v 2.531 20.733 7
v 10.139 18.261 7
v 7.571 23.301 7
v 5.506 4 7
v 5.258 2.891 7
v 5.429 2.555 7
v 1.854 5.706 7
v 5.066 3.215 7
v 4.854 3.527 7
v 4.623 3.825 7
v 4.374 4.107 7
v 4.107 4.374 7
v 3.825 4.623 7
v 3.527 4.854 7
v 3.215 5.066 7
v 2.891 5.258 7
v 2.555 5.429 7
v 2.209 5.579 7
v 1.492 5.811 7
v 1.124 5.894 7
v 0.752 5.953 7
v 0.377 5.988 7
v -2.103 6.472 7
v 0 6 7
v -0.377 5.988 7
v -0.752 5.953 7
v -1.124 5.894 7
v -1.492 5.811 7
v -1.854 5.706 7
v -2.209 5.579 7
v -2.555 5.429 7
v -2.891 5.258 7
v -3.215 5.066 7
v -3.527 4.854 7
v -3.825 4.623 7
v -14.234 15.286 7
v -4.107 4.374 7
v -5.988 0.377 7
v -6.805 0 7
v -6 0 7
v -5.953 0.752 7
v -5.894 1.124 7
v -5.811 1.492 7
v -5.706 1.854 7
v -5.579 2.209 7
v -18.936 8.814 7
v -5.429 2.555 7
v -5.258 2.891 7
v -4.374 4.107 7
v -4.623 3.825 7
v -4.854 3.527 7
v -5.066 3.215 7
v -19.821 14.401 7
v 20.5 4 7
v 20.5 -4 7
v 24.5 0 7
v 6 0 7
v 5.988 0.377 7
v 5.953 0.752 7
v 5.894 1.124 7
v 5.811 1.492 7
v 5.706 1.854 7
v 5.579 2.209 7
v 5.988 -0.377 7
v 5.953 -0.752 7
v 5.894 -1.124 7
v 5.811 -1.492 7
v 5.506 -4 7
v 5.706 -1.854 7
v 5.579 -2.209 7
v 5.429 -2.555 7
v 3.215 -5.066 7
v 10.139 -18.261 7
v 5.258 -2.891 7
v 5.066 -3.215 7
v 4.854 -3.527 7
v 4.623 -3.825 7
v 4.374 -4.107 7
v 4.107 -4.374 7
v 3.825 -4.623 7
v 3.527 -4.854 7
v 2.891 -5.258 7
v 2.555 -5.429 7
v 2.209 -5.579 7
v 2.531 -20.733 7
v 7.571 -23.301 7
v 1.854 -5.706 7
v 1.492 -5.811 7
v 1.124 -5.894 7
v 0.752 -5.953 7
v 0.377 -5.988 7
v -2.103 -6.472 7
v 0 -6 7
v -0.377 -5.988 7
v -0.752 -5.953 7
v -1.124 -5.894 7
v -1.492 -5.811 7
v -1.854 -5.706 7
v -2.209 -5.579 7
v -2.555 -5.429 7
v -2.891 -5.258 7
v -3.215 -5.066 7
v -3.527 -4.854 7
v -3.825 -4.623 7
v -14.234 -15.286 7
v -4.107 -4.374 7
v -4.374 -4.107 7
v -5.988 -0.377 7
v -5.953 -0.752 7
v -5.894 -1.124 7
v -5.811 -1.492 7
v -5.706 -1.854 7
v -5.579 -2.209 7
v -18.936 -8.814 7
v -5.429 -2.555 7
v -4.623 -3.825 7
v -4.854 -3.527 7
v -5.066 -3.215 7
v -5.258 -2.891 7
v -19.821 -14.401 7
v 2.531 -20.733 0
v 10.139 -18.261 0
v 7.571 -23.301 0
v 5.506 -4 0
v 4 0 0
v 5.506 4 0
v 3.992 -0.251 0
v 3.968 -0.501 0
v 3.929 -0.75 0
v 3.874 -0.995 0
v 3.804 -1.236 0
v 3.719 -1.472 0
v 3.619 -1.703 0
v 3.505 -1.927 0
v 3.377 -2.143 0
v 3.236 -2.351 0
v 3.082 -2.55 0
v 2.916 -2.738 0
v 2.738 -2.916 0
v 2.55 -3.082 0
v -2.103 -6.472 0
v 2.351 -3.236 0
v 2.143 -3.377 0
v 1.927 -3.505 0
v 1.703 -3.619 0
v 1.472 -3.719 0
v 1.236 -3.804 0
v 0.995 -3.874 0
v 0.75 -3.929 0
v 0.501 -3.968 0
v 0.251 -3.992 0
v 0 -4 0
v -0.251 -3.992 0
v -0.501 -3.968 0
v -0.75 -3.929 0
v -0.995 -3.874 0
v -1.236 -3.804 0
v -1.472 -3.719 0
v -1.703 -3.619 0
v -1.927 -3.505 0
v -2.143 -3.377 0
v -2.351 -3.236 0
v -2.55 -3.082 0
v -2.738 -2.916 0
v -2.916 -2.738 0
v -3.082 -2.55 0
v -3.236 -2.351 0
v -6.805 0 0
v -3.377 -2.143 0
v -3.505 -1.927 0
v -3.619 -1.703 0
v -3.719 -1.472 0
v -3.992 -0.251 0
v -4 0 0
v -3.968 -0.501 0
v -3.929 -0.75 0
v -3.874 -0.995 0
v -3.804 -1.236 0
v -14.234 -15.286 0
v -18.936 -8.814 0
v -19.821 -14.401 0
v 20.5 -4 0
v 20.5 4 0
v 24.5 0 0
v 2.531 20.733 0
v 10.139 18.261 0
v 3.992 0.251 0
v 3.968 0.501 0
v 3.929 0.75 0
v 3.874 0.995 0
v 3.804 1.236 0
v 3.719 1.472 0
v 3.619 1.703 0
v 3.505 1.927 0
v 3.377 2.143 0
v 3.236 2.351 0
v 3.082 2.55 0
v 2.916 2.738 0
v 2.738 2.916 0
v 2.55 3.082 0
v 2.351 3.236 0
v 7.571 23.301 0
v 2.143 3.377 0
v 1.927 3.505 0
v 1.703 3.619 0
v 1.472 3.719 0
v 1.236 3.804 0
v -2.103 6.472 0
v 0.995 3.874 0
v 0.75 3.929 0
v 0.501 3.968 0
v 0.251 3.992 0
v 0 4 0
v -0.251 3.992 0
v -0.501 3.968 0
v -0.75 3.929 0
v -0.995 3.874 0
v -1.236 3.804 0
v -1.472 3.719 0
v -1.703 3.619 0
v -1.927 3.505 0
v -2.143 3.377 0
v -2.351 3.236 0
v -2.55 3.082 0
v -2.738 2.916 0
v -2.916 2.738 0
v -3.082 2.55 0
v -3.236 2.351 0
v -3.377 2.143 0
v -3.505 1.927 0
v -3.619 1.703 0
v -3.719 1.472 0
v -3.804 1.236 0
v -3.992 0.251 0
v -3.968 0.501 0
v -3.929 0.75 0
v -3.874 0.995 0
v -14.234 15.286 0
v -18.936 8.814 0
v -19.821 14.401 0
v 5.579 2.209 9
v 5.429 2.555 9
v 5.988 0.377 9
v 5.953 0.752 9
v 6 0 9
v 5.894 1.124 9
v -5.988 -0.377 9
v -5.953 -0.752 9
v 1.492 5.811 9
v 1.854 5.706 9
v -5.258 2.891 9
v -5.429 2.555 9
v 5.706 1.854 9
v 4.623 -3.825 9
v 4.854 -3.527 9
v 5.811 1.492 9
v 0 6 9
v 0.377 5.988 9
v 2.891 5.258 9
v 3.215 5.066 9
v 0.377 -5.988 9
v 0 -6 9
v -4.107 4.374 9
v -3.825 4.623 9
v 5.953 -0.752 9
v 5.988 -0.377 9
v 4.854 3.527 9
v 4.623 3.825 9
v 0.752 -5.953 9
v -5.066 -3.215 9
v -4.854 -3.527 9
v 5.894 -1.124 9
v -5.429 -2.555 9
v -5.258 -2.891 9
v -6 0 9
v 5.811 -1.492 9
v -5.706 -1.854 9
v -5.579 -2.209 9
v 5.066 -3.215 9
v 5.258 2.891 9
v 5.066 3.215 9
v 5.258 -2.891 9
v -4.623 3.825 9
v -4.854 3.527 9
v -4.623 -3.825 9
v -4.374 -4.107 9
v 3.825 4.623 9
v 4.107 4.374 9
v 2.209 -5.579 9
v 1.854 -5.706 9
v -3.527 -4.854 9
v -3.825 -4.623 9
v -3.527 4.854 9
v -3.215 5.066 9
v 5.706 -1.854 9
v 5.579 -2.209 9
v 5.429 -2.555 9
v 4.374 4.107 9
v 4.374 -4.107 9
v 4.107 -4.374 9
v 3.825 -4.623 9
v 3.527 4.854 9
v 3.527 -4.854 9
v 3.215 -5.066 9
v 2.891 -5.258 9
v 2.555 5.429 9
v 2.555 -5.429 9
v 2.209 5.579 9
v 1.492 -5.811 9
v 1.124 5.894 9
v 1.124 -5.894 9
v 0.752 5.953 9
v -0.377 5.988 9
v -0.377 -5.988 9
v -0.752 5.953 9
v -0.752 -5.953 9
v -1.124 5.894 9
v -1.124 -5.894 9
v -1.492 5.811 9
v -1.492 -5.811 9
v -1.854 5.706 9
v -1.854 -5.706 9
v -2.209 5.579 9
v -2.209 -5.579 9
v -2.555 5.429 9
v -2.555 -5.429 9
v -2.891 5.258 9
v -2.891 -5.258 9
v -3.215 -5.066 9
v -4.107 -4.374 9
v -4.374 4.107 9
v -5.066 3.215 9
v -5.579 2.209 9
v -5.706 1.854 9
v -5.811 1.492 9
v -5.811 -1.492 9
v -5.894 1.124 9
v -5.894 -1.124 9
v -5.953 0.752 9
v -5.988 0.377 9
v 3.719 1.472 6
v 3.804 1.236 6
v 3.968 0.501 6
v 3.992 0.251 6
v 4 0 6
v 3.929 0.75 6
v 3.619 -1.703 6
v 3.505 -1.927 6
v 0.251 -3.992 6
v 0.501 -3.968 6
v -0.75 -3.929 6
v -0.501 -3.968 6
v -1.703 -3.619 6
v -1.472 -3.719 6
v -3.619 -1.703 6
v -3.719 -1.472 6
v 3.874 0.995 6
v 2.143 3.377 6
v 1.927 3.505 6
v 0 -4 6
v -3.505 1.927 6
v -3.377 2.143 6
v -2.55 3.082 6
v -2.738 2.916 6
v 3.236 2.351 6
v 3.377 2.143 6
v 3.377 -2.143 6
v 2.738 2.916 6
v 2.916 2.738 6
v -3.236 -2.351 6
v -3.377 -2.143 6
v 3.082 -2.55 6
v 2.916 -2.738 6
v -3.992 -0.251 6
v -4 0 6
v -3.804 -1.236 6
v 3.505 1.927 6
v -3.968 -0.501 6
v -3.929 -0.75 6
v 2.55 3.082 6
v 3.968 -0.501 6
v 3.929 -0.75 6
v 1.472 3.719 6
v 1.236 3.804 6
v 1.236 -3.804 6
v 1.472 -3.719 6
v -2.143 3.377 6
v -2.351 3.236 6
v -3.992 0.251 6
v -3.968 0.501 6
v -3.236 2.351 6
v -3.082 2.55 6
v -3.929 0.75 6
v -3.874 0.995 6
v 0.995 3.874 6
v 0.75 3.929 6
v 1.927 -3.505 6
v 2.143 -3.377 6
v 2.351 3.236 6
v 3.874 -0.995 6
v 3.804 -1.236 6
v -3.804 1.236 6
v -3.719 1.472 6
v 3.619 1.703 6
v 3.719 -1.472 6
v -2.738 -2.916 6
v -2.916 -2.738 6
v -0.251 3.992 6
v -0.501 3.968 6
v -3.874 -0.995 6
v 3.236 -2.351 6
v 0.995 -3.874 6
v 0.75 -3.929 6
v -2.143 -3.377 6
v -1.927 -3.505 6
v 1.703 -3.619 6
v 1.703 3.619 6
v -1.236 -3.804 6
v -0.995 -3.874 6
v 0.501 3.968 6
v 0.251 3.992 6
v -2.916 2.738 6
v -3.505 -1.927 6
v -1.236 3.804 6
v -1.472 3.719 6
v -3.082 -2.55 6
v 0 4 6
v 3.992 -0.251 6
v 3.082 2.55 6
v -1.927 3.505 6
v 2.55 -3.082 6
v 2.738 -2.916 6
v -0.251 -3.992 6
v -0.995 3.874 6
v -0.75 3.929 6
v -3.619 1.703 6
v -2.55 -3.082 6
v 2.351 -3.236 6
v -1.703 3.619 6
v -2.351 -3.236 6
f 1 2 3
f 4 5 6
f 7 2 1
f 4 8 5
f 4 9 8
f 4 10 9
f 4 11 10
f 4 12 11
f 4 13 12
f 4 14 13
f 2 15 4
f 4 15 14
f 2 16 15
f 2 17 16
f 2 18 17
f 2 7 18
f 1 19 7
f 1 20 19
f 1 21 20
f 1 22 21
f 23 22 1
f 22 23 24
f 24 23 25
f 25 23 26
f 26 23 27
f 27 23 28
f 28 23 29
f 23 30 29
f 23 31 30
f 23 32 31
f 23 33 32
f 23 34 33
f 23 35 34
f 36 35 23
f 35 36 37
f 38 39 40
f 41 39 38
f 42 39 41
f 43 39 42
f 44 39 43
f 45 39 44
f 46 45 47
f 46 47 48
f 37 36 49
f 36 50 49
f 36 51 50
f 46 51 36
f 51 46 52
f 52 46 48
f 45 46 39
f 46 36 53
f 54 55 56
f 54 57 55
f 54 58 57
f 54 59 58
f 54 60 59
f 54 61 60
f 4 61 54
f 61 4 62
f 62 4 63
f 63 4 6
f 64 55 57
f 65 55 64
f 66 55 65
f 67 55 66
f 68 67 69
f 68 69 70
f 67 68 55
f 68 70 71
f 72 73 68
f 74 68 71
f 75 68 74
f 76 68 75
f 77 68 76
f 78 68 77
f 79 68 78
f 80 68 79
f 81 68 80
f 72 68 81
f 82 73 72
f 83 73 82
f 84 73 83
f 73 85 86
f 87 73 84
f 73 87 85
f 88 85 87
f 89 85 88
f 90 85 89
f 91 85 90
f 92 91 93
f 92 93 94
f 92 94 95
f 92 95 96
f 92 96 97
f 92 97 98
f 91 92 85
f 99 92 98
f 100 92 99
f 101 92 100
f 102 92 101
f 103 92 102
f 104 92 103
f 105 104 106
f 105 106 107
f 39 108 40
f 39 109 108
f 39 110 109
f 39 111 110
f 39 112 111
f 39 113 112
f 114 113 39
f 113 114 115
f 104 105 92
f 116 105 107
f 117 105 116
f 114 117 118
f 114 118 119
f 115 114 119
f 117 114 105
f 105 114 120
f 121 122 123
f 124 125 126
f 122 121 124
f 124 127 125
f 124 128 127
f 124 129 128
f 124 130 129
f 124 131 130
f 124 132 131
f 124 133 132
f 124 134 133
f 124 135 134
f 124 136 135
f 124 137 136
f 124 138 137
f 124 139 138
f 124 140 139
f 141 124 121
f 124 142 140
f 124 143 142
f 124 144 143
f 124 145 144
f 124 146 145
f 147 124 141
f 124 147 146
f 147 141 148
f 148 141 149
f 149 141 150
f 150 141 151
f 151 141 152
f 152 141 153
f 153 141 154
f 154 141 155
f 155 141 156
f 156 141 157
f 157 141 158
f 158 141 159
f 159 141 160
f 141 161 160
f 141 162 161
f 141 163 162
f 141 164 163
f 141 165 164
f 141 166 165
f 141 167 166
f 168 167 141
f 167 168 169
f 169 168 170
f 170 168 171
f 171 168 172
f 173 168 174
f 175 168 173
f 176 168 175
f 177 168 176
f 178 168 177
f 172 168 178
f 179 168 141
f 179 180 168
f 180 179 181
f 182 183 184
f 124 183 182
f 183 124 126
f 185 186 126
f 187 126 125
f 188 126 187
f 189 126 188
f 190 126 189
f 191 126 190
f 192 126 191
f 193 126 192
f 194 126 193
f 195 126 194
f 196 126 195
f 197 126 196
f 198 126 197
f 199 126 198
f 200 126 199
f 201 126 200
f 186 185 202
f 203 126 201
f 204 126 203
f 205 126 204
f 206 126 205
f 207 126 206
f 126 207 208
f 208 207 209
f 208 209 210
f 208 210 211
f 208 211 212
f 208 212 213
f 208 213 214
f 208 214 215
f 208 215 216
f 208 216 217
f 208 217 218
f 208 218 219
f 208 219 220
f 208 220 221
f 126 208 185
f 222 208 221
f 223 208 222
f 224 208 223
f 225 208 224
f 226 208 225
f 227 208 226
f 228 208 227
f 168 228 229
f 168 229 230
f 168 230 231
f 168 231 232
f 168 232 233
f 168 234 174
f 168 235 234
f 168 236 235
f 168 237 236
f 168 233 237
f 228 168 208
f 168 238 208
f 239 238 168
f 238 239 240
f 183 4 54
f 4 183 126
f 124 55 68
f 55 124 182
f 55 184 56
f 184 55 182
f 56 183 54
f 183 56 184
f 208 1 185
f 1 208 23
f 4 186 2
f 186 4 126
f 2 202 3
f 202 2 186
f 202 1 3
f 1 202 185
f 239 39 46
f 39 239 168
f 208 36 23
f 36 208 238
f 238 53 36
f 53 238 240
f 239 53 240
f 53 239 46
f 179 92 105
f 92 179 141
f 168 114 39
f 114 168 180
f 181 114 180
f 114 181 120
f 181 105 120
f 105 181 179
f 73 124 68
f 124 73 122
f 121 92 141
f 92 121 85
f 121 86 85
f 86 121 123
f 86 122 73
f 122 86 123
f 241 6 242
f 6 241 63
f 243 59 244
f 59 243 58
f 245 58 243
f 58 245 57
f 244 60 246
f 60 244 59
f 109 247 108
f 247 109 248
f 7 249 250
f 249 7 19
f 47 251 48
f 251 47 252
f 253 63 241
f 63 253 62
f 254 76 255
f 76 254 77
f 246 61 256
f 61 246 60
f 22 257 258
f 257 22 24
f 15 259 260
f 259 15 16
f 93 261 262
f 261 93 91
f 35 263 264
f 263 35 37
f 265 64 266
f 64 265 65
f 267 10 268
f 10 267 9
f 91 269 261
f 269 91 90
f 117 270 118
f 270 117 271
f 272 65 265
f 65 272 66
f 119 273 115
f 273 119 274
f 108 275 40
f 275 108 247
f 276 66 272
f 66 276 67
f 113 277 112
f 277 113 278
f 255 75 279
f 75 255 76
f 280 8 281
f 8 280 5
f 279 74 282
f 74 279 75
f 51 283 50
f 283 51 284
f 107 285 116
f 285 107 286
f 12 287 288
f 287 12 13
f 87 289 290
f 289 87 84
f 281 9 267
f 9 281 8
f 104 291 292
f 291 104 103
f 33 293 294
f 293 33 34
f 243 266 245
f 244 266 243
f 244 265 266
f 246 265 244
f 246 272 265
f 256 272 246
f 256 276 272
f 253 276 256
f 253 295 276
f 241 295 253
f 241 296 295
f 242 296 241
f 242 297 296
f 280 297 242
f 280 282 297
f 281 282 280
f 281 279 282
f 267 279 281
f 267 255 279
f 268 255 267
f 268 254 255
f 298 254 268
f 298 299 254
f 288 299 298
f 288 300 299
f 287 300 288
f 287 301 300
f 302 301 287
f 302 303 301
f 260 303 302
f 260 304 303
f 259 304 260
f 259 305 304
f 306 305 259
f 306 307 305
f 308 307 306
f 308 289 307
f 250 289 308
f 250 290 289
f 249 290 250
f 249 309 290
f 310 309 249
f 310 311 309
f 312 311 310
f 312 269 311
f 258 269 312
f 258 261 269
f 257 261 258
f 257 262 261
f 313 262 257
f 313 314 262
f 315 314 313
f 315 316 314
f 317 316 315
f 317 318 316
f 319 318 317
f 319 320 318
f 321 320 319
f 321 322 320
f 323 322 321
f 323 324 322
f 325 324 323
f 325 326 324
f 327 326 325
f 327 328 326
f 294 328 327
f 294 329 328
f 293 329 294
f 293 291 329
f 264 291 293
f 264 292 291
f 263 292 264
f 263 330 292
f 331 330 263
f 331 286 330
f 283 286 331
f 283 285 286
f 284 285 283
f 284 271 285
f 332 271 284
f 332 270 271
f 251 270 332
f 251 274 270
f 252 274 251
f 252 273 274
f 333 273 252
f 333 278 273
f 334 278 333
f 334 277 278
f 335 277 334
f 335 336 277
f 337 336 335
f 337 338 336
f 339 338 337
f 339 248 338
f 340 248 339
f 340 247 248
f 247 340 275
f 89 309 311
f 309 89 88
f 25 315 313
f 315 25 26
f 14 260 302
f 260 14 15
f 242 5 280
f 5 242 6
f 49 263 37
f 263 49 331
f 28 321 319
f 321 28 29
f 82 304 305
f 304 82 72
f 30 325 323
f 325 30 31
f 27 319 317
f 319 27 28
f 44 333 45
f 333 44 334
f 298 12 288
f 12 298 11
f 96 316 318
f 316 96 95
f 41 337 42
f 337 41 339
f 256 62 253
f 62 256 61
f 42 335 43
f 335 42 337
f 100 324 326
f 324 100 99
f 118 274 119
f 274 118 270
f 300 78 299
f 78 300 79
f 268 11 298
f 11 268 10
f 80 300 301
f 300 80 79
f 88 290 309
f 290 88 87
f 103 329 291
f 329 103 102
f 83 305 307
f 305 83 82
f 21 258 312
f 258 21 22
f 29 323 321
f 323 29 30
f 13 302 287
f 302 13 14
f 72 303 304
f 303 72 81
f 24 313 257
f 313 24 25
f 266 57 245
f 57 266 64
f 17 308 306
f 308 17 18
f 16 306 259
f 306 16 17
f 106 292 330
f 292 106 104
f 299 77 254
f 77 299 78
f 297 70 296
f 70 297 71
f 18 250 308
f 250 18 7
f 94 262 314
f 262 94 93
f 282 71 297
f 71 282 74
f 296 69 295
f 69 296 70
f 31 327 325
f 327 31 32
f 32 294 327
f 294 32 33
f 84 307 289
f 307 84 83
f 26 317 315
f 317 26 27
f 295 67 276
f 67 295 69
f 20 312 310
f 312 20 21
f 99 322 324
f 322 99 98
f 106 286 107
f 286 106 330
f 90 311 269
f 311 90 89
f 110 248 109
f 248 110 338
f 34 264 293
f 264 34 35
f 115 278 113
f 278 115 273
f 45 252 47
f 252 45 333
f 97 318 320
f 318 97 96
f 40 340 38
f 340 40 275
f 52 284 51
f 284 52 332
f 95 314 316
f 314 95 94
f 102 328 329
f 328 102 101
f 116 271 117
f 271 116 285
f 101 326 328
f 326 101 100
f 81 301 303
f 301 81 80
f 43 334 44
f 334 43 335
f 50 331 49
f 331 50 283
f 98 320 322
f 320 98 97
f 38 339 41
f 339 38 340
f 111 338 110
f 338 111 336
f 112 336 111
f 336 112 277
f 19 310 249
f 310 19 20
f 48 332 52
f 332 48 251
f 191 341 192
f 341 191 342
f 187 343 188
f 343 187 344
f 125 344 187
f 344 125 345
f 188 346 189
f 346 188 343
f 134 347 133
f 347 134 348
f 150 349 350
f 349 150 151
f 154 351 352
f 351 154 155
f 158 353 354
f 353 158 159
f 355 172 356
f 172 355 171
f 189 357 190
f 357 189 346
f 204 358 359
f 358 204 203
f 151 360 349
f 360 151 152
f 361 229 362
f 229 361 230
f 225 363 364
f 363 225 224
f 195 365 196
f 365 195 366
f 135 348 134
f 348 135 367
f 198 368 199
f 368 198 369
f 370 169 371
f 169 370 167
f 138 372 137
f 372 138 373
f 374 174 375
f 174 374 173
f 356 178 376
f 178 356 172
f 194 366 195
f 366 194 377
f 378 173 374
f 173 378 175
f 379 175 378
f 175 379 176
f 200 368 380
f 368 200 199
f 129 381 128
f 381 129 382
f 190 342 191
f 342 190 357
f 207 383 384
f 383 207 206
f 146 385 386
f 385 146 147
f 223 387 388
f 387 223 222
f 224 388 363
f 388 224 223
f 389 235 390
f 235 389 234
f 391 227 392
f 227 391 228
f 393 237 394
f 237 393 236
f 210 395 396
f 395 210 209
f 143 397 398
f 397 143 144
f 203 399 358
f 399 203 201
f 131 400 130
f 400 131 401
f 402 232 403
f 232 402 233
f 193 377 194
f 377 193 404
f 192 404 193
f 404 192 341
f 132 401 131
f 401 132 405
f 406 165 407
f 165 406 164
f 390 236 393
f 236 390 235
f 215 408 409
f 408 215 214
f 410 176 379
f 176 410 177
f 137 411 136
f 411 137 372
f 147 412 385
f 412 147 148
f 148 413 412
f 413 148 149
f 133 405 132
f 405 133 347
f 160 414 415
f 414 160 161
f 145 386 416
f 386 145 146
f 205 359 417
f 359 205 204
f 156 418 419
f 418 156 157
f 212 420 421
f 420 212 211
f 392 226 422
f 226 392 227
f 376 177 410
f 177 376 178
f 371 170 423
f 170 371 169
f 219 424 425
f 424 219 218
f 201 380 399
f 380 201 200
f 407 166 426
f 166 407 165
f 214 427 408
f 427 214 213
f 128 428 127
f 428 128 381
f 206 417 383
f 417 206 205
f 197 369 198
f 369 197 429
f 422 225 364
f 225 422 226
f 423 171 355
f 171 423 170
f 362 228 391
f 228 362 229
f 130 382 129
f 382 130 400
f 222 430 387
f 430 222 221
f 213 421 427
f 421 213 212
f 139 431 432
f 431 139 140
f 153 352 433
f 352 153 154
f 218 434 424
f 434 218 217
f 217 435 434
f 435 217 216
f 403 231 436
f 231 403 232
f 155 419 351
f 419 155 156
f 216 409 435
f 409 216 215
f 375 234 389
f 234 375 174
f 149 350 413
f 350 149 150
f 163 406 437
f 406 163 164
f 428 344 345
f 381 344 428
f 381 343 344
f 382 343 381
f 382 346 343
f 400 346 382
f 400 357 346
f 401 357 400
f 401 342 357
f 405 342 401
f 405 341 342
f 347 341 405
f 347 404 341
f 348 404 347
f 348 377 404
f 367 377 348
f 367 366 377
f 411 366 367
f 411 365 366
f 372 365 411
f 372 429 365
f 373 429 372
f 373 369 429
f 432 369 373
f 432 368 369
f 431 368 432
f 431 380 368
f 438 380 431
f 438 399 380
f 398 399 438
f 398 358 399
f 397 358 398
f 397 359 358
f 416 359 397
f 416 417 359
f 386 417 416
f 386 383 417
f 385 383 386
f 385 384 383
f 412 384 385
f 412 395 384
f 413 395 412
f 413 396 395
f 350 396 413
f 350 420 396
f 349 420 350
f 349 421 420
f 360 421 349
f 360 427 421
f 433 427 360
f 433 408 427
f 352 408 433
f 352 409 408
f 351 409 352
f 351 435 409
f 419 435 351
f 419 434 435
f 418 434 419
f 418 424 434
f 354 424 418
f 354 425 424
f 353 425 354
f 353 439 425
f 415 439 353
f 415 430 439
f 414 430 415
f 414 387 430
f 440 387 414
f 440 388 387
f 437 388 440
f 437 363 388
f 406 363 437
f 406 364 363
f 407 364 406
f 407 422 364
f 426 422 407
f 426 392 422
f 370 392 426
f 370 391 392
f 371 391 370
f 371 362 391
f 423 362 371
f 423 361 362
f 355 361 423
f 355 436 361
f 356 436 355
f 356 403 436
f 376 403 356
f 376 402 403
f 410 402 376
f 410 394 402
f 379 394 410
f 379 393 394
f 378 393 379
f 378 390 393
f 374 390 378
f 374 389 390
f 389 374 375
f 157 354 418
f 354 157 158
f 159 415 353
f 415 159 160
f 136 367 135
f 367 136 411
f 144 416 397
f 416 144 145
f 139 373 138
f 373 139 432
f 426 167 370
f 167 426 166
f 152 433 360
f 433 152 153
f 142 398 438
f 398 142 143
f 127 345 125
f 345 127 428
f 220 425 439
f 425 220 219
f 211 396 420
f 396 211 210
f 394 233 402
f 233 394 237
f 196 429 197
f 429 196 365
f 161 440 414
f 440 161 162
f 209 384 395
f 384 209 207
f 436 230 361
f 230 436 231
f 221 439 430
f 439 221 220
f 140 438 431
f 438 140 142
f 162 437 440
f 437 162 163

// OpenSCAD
// Configurações de resolução
$fn=100;
$fs=0.1;

// Parâmetros (em mm)
hub_d = 12;      // Diâmetro do centro
overall_d = 49;  // Diâmetro total (ponta a ponta)
arm_w = 8;       // Largura da hélice
arm_t = 7;       // Espessura da hélice
overall_t = 9;   // <--- REDUZIDO de 11 para 9 para diminuir a altura do centro
tip_l = 4;       // Comprimento da ponta em V
hole_d = 8;      // Diâmetro do furo inferior
hole_depth = 6;  // Profundidade do furo inferior (cego)

// Comprimento da parte reta (saindo do centro absoluto até o início da ponta)
arm_total_l = (overall_d / 2) - tip_l;

module um_braco() {
  union() {
    // Parte reta do braço começando no centro exato (X=0, Z=0)
    translate([0, -arm_w / 2, 0]) 
      cube([arm_total_l, arm_w, arm_t]);
      
    // Ponta em V
    translate([arm_total_l, 0, 0]) 
      linear_extrude(height = arm_t)
        polygon(points = [[0, -arm_w / 2], [tip_l, 0], [0, arm_w / 2]]);
  }
}

module peca_final() {
  difference() {
    union() {
      // 1. Cilindro central (começa em Z=0 e sobe até a espessura total)
      cylinder(d = hub_d, h = overall_t);
      
      // 2. Adiciona as 5 hélices (começam em Z=0 e se fundem no centro)
      for (i = [0:4]) {
        rotate([0, 0, i * 72]) um_braco();
      }
    }
    
    // Subtração: Furo inferior cego
    // Começa um pouco abaixo de zero (-0.1) para garantir um corte perfeito na base
    translate([0, 0, -0.1]) 
      cylinder(d = hole_d, h = hole_depth + 0.1);
  }
}

// Renderiza a peça final
peca_final();
